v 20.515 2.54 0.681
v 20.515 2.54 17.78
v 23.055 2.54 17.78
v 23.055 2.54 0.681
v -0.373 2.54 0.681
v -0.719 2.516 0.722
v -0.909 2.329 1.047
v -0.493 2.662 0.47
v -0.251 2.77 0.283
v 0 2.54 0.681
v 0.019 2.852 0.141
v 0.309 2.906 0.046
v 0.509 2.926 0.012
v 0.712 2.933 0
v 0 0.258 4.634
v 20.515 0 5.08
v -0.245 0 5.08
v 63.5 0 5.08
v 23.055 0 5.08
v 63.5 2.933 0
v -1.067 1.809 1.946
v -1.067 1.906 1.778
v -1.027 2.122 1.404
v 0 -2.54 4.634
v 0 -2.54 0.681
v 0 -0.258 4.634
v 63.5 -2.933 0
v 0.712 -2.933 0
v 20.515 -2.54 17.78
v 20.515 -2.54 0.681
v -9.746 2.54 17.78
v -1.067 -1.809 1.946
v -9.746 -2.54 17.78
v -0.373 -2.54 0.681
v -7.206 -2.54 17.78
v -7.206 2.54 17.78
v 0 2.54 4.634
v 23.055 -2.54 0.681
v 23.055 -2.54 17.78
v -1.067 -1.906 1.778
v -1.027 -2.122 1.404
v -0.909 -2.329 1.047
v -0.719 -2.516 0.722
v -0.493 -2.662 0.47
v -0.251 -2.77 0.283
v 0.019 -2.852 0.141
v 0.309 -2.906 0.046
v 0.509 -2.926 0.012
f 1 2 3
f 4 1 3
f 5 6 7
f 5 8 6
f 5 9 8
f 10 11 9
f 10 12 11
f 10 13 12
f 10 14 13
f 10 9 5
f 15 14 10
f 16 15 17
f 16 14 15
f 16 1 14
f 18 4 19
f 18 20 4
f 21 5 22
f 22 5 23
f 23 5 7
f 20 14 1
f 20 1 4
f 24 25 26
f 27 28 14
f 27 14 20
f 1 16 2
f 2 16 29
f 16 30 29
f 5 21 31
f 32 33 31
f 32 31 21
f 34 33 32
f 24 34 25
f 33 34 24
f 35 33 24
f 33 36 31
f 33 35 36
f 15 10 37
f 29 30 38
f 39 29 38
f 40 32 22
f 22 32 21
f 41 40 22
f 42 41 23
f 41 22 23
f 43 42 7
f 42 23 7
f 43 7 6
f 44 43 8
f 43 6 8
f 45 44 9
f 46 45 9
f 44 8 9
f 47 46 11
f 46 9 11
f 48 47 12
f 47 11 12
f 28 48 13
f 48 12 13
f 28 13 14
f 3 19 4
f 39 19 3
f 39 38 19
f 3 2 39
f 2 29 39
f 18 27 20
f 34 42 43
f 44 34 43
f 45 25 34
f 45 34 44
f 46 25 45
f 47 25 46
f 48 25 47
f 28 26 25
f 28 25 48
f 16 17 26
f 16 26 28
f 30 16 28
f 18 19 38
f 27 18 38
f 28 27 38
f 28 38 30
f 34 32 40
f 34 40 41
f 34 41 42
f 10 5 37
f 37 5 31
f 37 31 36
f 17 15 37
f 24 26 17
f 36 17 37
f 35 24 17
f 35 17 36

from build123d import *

# Parameters (mm, degrees)
F1_DEPTH      = 63.5
F1_DEPTH_BACK = 1.0668
F2_W          = 2.54
F2_H          = 17.78
F3_DEPTH      = 2.54
F4_DEPTH      = 2.54
F5_R          = 1.77830971


# Not quite as in the source:
# - a feature names something its author has since deleted; it is built from what else it names


with BuildPart() as f1:
    # F0 (on Right) → F1 (new body, two sides)
    with BuildSketch(Plane.YZ) as f1_sk:
        Polygon((2.9329393675, 0), (0, 5.08), (-2.9329393675, 0), align=None)
    extrude(amount=F1_DEPTH)
    extrude(f1_sk.sketch, amount=-F1_DEPTH_BACK)

    # F2 (on Front) → F3 (join, symmetric)
    with BuildSketch(Plane.XZ):
        with Locations((21.7847247761, 8.89)):
            Rectangle(F2_W, F2_H)
    extrude(amount=F3_DEPTH, both=True)

    # F2 (on Front) → F4 (join, symmetric)
    with BuildSketch(Plane.XZ):
        Polygon((-9.746064432, 17.78), (0, 0), (0, 4.6337883681), (-7.206064432, 17.78), align=None)
    extrude(amount=F4_DEPTH, both=True)

    # F5
    f5_edges = [f1.edges().sort_by_distance(p)[0] for p in [
        (-1.0668, 0, 0),
    ]]
    fillet(f5_edges, radius=F5_R)


solid = f1.part
